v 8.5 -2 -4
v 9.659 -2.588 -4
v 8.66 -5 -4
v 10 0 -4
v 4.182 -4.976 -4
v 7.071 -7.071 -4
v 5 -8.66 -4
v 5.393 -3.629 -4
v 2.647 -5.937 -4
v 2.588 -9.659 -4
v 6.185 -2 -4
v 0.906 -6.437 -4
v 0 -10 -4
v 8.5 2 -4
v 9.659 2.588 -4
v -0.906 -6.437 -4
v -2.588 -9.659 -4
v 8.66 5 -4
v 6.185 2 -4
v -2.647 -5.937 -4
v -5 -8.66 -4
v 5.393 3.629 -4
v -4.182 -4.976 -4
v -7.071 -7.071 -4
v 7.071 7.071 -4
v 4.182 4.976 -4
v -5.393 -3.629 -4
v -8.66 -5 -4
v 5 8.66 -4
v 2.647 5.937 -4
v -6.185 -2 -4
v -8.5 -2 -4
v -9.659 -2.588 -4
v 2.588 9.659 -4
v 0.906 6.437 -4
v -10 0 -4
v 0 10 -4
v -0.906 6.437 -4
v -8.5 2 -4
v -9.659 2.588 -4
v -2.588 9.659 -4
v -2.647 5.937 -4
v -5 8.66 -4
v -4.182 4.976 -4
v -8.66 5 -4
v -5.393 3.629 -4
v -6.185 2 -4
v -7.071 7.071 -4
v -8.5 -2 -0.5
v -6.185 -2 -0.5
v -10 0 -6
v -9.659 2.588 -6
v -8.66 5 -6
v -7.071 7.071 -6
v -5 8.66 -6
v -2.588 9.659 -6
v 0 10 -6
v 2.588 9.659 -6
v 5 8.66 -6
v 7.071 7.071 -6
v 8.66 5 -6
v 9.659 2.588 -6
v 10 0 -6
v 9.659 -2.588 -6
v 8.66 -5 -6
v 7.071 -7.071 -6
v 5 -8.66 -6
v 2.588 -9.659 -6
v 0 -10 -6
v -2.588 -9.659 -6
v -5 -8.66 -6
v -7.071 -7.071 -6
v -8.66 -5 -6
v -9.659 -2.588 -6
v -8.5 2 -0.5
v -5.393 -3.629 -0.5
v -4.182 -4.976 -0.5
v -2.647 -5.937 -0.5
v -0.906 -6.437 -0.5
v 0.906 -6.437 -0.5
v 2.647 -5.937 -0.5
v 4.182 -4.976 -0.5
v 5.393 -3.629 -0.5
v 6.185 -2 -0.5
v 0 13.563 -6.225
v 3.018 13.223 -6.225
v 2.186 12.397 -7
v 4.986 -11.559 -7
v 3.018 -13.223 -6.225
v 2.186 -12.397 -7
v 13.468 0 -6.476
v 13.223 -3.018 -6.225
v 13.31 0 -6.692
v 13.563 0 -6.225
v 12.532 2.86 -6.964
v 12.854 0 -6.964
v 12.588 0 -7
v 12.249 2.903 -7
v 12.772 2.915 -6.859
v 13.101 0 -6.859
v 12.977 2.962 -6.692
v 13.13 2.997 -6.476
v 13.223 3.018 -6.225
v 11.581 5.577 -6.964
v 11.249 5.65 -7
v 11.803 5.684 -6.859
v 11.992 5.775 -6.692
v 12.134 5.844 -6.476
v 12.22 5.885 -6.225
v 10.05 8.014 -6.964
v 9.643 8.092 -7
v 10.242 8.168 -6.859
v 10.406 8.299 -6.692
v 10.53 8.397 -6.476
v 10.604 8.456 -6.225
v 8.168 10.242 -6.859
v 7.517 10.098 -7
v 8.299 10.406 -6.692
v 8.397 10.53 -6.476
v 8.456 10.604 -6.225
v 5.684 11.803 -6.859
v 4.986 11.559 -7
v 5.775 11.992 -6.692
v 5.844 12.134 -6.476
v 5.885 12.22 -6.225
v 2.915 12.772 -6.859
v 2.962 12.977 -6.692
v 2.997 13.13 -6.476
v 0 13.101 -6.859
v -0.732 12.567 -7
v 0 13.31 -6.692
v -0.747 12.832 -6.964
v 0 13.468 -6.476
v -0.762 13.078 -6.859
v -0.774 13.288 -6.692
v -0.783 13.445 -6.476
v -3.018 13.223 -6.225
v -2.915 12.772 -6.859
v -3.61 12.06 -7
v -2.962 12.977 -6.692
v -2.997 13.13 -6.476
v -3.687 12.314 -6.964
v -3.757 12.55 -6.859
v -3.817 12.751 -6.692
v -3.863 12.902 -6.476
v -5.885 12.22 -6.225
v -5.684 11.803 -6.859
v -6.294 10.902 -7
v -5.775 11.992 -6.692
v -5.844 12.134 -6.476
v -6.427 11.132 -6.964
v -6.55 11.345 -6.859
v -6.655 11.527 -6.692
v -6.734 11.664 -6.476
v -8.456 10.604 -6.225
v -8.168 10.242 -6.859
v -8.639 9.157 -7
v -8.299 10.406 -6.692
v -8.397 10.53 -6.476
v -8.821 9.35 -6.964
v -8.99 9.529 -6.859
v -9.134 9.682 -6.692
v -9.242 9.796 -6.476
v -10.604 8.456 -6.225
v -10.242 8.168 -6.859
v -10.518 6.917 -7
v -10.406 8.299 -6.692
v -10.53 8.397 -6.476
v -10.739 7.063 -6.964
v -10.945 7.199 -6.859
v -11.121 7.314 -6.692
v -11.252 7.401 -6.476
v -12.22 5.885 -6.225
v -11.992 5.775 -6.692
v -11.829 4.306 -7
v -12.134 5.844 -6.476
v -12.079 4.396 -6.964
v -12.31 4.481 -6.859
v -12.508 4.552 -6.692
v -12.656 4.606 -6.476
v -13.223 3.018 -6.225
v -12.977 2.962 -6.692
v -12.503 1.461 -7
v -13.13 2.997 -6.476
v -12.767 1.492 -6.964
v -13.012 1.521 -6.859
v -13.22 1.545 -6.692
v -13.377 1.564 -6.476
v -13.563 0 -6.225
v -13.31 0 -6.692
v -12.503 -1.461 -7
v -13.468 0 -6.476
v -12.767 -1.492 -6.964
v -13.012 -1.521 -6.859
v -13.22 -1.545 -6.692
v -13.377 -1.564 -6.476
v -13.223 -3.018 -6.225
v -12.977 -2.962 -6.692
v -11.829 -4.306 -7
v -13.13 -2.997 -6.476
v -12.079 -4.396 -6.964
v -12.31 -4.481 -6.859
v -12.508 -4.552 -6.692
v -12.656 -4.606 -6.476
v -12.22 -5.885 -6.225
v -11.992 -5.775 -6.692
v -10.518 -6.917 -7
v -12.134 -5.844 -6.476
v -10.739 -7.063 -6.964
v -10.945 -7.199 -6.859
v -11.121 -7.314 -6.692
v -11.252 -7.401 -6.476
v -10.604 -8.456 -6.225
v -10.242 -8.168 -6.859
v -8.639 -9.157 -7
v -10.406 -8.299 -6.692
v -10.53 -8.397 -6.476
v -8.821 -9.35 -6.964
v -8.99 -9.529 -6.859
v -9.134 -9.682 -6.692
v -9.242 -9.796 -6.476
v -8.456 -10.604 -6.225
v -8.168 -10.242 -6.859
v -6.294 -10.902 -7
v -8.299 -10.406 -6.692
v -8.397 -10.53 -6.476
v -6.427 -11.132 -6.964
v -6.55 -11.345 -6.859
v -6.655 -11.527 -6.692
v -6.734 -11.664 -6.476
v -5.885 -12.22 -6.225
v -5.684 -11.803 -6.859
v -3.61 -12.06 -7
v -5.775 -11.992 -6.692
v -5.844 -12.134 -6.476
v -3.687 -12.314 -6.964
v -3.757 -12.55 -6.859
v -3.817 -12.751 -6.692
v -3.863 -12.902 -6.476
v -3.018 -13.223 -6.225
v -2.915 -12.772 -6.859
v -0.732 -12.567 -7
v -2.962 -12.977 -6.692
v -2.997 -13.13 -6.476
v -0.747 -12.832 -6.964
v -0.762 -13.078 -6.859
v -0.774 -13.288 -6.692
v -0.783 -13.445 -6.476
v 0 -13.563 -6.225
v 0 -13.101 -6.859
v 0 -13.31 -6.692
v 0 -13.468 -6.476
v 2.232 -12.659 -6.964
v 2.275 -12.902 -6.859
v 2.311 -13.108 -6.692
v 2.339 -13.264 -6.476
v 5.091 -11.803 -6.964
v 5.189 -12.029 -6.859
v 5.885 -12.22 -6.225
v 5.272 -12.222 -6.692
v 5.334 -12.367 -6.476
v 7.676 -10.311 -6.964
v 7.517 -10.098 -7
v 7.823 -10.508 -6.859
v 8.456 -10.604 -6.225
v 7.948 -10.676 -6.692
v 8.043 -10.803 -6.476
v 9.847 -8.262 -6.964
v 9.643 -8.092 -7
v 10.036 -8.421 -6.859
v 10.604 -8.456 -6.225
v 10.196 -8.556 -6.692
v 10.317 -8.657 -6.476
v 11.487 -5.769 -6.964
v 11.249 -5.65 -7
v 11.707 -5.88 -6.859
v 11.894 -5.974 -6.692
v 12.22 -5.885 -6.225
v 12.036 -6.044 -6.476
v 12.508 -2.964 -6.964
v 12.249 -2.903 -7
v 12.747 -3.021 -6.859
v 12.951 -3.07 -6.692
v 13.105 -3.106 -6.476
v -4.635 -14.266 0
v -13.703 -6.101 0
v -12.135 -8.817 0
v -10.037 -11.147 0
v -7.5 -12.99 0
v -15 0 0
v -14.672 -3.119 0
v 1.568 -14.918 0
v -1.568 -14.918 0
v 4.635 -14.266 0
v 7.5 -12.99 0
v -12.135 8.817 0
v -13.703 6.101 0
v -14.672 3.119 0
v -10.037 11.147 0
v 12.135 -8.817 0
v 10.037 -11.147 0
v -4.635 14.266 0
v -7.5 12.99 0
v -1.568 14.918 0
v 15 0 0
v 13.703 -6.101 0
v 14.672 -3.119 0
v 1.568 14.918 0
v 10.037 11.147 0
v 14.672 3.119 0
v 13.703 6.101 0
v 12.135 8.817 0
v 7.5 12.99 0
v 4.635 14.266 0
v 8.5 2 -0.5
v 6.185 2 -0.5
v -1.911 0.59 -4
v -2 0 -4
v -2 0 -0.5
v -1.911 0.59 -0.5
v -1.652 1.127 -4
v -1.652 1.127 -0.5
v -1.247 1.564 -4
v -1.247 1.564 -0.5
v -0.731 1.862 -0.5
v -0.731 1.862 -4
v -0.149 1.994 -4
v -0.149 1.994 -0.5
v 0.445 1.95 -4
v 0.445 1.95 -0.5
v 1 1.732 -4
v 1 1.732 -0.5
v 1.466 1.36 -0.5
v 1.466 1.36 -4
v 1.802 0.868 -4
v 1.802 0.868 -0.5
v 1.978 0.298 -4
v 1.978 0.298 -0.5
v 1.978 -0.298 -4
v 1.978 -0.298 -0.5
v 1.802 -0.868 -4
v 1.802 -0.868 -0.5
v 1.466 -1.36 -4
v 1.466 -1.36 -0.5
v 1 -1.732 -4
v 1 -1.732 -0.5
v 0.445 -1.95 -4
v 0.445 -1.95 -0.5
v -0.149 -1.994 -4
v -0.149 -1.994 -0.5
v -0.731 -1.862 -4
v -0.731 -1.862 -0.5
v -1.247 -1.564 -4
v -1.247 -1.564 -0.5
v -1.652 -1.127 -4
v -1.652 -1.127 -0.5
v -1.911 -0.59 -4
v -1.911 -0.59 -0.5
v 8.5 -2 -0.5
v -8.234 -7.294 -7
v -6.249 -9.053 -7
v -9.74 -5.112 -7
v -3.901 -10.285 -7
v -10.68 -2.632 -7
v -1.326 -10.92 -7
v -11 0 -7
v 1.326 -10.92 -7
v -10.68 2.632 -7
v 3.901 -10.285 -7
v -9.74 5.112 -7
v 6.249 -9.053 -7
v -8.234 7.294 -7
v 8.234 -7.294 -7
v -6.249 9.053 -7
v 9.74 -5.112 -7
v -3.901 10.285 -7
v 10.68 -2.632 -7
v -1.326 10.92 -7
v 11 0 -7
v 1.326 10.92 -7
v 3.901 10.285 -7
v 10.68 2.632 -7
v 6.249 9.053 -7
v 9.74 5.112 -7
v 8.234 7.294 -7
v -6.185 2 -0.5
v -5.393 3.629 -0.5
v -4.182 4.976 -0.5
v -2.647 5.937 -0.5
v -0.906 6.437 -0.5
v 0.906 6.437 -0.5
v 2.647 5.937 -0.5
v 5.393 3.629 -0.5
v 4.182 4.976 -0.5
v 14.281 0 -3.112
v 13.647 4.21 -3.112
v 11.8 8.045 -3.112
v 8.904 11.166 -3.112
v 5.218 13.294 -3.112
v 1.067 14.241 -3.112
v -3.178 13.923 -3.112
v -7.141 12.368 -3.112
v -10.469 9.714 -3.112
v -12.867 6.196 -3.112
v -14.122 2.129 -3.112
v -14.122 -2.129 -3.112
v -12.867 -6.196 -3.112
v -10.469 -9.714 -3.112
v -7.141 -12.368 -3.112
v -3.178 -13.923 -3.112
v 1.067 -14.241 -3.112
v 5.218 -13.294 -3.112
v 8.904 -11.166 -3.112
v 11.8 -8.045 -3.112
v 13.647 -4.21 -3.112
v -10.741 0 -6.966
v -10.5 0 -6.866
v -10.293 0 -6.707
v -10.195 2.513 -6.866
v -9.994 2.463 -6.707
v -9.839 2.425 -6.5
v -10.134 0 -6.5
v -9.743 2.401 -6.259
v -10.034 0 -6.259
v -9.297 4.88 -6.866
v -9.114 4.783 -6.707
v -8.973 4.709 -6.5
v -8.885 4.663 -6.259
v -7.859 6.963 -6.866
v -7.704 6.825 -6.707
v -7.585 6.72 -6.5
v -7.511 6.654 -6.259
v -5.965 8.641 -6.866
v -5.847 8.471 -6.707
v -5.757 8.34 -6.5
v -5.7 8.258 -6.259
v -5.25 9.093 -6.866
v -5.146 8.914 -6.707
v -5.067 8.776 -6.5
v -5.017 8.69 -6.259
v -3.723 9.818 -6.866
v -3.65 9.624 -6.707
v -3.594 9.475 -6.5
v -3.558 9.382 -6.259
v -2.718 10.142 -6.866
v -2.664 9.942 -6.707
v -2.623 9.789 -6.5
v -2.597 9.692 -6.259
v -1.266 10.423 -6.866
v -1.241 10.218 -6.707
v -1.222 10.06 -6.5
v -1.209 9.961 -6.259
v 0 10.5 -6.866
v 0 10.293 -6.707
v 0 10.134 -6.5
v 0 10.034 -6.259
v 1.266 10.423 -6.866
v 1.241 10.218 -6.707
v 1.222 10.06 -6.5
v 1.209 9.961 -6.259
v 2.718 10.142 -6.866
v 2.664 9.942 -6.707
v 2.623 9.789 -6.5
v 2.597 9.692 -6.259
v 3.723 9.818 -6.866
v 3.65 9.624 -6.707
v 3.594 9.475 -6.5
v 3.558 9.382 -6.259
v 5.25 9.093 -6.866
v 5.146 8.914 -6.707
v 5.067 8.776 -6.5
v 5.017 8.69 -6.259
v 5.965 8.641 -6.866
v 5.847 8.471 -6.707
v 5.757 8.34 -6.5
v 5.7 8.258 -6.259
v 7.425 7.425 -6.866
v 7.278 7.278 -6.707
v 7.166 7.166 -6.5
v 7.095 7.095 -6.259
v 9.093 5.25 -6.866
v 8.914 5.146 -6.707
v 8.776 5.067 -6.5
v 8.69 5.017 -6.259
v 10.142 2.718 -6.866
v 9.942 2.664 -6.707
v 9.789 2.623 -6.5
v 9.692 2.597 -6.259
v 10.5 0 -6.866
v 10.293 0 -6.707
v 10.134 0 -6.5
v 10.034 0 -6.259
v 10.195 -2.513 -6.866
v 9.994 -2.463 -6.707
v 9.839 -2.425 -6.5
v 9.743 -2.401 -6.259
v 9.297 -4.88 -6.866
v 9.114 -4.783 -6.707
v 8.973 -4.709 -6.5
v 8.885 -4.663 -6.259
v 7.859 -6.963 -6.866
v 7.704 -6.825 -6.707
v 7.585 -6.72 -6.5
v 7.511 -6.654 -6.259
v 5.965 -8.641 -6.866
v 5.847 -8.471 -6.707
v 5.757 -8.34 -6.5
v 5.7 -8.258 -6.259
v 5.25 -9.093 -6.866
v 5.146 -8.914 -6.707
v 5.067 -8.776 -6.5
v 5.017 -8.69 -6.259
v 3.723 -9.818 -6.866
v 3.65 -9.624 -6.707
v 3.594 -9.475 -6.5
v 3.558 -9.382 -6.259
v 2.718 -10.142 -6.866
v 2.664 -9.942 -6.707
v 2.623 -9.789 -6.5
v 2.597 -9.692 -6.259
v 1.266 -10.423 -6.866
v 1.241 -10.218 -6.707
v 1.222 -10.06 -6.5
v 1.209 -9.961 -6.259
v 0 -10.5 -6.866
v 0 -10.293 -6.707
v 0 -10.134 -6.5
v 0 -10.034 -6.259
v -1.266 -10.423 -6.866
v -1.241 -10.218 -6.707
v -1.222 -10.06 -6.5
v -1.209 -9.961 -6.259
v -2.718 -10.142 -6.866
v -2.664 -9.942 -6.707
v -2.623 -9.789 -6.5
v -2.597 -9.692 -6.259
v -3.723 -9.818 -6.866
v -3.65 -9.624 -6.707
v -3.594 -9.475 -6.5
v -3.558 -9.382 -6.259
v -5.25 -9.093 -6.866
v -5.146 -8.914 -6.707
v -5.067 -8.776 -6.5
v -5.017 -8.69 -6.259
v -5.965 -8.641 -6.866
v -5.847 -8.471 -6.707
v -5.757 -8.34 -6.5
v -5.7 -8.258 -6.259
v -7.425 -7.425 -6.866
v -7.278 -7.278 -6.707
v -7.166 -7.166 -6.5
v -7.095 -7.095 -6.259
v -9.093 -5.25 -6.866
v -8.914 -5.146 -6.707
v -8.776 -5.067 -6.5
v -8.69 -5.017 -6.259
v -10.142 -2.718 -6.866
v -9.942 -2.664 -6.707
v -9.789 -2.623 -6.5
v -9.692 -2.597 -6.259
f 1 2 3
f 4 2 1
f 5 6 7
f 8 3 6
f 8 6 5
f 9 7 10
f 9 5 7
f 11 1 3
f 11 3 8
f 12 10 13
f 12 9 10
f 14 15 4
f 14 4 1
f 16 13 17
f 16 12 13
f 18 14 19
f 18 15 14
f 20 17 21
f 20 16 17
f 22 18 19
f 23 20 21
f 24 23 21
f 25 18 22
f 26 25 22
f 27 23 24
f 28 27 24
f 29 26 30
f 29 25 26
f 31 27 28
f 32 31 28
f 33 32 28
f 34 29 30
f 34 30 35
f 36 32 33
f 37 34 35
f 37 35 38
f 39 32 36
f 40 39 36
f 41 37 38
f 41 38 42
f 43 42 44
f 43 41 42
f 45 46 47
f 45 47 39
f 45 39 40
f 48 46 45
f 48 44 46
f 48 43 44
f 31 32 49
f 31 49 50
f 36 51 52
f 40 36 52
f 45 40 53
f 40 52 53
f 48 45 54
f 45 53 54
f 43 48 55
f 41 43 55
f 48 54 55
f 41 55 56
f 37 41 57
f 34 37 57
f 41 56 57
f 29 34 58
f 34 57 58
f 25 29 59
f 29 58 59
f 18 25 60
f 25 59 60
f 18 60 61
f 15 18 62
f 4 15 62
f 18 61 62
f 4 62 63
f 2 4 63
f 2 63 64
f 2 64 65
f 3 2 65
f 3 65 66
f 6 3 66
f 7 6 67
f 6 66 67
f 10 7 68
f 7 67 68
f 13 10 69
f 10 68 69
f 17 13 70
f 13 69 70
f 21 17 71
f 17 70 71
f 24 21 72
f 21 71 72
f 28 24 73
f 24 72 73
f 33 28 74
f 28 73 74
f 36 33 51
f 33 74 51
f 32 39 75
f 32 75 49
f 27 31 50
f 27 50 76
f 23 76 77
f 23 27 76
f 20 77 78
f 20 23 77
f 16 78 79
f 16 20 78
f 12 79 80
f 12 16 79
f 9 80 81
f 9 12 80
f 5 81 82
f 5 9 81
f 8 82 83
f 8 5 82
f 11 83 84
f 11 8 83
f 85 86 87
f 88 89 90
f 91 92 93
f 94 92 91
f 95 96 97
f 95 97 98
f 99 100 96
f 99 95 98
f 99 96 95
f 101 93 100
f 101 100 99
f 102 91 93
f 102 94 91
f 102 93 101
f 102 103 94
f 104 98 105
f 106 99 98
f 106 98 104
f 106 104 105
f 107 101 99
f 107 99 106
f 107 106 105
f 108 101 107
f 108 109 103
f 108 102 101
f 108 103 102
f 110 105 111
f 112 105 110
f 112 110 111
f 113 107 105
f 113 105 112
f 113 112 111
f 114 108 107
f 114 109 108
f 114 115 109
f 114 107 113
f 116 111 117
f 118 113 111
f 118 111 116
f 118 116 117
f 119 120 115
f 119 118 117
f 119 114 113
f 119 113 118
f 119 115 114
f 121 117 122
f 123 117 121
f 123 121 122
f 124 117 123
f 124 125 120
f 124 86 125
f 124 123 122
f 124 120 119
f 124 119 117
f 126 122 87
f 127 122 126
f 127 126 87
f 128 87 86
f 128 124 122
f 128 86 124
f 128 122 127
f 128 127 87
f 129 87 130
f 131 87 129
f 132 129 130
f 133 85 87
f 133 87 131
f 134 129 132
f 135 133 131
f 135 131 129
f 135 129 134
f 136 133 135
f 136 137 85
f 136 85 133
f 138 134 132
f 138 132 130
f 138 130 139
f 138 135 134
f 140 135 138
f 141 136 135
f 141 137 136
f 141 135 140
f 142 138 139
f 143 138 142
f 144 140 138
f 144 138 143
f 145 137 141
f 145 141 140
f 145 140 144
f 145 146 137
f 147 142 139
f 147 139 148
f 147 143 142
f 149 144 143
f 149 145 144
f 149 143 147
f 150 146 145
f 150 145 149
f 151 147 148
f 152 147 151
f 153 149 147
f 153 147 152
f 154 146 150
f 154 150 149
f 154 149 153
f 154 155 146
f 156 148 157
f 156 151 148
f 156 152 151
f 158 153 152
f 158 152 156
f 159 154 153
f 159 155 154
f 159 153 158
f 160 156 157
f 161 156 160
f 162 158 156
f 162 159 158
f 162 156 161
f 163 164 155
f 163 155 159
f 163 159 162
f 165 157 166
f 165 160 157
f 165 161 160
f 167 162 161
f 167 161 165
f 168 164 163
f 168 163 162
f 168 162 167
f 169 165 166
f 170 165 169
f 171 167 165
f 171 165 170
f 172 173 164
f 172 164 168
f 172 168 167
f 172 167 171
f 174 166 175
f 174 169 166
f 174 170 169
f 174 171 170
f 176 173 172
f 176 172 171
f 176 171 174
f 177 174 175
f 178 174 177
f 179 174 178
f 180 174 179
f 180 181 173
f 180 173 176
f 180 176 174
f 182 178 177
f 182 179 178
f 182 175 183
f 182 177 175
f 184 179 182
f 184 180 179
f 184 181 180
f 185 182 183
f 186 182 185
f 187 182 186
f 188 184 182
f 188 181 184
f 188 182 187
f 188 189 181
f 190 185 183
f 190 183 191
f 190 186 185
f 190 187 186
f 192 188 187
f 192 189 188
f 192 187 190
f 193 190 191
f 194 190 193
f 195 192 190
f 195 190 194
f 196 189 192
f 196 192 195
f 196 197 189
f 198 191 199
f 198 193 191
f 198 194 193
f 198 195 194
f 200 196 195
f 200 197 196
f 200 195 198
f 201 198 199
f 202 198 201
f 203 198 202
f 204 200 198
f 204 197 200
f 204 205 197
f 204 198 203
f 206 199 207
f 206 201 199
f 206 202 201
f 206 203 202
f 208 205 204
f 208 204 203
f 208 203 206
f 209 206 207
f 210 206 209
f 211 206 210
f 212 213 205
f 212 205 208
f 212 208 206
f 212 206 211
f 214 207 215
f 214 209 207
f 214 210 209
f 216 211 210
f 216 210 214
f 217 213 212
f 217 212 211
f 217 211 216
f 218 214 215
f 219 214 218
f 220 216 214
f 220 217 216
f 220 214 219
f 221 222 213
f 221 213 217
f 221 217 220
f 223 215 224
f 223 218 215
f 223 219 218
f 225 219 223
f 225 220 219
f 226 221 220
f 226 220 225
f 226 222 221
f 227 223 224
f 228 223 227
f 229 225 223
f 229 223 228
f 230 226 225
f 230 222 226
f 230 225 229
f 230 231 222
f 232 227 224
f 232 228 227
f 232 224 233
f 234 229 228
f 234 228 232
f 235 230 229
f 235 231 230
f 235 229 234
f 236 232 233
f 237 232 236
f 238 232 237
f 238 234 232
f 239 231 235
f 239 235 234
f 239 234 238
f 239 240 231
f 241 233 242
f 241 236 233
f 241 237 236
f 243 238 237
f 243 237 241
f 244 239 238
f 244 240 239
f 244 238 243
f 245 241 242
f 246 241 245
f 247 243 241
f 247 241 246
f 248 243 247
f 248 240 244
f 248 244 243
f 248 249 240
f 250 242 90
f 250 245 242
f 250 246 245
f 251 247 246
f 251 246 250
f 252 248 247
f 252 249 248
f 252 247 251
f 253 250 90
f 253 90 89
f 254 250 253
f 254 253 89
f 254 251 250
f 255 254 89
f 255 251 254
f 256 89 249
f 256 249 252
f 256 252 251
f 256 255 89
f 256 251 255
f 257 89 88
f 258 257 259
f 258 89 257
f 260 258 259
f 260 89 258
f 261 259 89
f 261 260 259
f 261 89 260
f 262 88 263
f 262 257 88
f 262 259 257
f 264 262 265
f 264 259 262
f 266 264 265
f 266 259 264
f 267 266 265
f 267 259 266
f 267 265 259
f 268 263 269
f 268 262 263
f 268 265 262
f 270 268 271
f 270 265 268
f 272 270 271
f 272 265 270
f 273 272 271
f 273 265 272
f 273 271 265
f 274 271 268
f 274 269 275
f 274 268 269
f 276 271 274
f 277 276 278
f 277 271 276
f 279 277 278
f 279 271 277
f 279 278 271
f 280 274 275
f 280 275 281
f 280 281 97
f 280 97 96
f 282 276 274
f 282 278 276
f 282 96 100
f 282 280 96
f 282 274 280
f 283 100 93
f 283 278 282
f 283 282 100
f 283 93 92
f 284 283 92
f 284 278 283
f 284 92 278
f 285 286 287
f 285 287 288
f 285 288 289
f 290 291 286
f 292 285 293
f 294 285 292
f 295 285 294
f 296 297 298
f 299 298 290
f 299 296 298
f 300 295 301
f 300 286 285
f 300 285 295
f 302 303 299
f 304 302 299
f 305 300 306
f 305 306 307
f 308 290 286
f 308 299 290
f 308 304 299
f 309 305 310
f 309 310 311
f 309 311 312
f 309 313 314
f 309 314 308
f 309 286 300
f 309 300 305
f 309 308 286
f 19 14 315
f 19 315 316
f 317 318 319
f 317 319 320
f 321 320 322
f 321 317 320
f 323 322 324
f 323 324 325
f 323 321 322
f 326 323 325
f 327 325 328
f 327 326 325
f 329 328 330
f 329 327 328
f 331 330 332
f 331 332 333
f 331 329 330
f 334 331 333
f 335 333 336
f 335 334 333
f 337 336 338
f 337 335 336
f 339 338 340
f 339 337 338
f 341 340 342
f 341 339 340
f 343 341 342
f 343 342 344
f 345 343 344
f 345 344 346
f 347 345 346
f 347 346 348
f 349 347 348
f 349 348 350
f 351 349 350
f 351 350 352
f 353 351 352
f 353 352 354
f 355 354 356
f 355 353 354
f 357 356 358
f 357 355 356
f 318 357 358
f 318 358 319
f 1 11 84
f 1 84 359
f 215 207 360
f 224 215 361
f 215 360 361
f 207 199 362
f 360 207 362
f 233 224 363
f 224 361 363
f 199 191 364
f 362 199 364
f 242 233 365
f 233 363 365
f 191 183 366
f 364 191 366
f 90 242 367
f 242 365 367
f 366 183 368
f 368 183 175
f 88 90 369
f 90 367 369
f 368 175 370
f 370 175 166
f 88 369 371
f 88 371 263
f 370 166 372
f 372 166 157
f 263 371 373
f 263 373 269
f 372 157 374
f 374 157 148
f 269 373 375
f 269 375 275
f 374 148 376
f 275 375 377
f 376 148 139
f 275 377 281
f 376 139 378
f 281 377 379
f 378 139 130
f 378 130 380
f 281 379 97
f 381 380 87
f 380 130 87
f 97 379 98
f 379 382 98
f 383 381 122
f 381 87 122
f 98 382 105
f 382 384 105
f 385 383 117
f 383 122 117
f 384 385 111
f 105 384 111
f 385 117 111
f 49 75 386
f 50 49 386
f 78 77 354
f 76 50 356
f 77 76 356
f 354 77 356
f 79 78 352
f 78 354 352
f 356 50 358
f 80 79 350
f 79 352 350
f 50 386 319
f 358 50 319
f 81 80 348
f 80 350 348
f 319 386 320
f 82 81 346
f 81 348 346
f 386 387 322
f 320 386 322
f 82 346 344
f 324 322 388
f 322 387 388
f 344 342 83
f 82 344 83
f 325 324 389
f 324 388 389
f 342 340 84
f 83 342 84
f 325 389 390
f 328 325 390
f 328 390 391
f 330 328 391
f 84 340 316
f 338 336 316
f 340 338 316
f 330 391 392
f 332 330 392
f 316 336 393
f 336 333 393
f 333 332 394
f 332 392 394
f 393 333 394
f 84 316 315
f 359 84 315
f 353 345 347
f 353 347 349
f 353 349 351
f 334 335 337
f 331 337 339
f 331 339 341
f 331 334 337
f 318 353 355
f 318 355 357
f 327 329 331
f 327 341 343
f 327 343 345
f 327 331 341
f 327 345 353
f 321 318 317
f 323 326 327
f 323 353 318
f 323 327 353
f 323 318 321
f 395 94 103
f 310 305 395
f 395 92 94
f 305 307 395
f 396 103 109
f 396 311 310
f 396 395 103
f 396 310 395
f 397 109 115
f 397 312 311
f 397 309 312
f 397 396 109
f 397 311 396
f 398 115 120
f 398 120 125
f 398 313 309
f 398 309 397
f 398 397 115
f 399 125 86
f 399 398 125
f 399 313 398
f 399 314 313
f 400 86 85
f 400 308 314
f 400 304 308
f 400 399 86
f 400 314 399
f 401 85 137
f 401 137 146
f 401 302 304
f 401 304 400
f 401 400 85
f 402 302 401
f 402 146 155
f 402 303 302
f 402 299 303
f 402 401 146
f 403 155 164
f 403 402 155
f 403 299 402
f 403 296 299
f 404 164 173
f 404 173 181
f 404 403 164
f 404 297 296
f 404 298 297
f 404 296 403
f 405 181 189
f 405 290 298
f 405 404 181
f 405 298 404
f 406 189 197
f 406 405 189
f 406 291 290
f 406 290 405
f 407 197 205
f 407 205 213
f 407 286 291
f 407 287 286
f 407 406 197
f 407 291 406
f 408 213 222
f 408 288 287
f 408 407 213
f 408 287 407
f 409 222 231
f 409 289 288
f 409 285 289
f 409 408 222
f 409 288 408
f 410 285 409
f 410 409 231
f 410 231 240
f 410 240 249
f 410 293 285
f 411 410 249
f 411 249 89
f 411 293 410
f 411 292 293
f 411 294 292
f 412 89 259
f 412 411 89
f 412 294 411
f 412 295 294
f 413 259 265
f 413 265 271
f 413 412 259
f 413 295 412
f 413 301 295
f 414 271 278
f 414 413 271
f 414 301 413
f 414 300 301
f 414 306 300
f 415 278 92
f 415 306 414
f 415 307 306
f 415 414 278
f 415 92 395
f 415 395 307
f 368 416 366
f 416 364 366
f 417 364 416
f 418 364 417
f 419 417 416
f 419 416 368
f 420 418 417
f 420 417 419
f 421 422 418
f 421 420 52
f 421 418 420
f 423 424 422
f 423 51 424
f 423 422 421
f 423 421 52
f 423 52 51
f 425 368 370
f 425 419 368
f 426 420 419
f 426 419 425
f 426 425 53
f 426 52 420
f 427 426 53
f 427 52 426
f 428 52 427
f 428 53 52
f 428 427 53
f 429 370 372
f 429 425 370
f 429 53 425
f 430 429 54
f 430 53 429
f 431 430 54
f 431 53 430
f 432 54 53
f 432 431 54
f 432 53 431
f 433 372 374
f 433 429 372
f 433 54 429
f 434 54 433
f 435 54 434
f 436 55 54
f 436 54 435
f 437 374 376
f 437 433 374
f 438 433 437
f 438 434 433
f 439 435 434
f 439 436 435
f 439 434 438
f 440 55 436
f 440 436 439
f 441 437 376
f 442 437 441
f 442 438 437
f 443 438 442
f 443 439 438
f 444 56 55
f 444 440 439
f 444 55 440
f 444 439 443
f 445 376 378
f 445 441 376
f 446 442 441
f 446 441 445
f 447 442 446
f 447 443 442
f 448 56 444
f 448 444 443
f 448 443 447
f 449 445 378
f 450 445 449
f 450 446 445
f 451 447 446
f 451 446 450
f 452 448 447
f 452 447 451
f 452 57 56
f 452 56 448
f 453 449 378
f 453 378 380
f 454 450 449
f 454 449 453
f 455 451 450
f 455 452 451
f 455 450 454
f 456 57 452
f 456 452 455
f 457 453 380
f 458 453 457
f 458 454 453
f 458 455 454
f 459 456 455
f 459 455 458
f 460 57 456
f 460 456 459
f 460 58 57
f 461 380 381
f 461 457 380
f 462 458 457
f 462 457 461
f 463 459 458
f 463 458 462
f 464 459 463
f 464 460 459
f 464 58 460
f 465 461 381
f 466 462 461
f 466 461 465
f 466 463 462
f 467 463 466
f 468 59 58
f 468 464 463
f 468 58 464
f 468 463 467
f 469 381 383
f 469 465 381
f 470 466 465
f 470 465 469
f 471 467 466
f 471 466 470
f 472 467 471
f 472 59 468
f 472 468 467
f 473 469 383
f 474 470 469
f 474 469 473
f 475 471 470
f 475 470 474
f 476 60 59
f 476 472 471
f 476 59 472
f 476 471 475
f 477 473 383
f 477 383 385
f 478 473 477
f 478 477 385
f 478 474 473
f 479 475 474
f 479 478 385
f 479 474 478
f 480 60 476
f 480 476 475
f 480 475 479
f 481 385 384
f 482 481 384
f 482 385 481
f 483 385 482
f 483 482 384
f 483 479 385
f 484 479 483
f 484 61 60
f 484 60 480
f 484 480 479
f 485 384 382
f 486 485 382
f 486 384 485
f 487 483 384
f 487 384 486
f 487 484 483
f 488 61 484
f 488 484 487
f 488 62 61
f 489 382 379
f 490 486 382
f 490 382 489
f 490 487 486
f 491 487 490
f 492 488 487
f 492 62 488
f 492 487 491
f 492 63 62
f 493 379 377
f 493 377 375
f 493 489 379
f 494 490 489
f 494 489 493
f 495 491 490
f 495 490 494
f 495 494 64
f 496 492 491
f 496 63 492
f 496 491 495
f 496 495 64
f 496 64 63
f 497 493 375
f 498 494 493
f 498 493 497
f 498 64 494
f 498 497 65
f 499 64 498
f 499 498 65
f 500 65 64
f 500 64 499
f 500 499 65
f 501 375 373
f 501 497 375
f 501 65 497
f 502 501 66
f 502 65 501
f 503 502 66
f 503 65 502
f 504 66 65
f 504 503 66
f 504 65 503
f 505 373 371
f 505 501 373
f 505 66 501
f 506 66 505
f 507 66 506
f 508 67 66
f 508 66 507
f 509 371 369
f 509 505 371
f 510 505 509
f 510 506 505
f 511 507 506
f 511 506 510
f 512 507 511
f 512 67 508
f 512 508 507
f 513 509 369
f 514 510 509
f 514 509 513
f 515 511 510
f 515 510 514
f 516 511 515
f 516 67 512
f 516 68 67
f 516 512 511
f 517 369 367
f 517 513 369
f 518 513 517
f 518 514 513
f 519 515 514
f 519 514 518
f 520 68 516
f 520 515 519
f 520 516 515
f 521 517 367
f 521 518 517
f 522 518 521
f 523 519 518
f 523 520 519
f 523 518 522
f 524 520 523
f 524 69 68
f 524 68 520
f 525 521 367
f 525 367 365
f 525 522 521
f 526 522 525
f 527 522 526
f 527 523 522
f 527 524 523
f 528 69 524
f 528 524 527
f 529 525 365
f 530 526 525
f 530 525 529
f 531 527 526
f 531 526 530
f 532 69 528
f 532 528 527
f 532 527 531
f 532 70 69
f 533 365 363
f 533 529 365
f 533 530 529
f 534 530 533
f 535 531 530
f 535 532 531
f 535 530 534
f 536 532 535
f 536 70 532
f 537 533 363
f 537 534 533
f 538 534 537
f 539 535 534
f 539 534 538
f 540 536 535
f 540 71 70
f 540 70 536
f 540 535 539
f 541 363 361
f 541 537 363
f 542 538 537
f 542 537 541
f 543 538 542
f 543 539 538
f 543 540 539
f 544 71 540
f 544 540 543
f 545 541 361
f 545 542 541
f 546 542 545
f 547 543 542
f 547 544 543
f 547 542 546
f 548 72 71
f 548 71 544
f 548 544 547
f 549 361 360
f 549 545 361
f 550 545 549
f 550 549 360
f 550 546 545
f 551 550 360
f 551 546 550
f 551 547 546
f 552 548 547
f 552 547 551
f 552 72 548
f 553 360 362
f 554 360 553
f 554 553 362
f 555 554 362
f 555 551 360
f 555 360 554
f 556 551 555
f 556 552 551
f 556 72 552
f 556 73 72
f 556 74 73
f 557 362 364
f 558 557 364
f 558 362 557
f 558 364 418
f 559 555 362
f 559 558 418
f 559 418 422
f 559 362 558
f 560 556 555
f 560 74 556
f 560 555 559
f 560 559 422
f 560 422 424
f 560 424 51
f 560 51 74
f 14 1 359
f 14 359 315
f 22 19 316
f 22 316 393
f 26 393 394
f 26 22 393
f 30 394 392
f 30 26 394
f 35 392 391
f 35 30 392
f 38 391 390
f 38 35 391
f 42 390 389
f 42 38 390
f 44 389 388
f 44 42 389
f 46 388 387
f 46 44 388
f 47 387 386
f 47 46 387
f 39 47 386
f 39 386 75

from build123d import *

# Parameters (mm, degrees)
CROQUIS1_R              = 15
SALIENTE_EXTRUIR1_DEPTH = 7
SALIENTE_EXTRUIR1_DRAFT = -13
CROQUIS3_R              = 10
CORTAR_EXTRUIR1_DEPTH   = 3
REDONDEO4_R             = 1
REDONDEO5_R             = 1
CROQUIS4_R              = 2
CORTAR_EXTRUIR3_DEPTH   = 3.5


with BuildPart() as part:
    # Croquis1 → Saliente-Extruir1 (with draft: the straight prism first)
    with BuildSketch(Plane.XY):
        Circle(CROQUIS1_R)
    extrude(amount=-SALIENTE_EXTRUIR1_DEPTH)
    # Saliente-Extruir1: the draft: its side faces are tilted about the plane it starts from
    saliente_extruir1_sides = [part.faces().sort_by_distance(p)[0] for p in [
        (-15, 0, -3.5),
    ]]
    draft(saliente_extruir1_sides, Plane.XY, SALIENTE_EXTRUIR1_DRAFT)

    # Croquis3 → Cortar-Extruir1 (cut)
    with BuildSketch(Plane(origin=(0, 0, -7), x_dir=(-1, 0, 0), z_dir=(0, 0, -1))):
        Circle(CROQUIS3_R)
    extrude(amount=-CORTAR_EXTRUIR1_DEPTH, mode=Mode.SUBTRACT)

    # Redondeo4
    redondeo4_edges = [part.edges().sort_by_distance(p)[0] for p in [
        (10, 0, -7),
    ]]
    fillet(redondeo4_edges, radius=REDONDEO4_R)

    # Redondeo5
    redondeo5_edges = [part.edges().sort_by_distance(p)[0] for p in [
        (-13.383922662, 0, -7),
    ]]
    fillet(redondeo5_edges, radius=REDONDEO5_R)

    # Croquis4 → Cortar-Extruir3 (cut)
    with BuildSketch(Plane(origin=(0, 0, -4), x_dir=(-1, 0, 0), z_dir=(0, 0, -1))):
        with BuildLine():
            Line((6.184658438, 2), (8.5, 2))
            Line((8.5, 2), (8.5, -2))
            Line((8.5, -2), (6.184658438, -2))
            ThreePointArc((6.184658438, -2), (0, -6.5), (-6.184658438, -2))
            Line((-6.184658438, -2), (-8.5, -2))
            Line((-8.5, -2), (-8.5, 2))
            Line((-8.5, 2), (-6.184658438, 2))
            ThreePointArc((-6.184658438, 2), (0, 6.5), (6.184658438, 2))
        make_face()
        Circle(CROQUIS4_R, mode=Mode.SUBTRACT)
    extrude(amount=-CORTAR_EXTRUIR3_DEPTH, mode=Mode.SUBTRACT)


solid = part.part
